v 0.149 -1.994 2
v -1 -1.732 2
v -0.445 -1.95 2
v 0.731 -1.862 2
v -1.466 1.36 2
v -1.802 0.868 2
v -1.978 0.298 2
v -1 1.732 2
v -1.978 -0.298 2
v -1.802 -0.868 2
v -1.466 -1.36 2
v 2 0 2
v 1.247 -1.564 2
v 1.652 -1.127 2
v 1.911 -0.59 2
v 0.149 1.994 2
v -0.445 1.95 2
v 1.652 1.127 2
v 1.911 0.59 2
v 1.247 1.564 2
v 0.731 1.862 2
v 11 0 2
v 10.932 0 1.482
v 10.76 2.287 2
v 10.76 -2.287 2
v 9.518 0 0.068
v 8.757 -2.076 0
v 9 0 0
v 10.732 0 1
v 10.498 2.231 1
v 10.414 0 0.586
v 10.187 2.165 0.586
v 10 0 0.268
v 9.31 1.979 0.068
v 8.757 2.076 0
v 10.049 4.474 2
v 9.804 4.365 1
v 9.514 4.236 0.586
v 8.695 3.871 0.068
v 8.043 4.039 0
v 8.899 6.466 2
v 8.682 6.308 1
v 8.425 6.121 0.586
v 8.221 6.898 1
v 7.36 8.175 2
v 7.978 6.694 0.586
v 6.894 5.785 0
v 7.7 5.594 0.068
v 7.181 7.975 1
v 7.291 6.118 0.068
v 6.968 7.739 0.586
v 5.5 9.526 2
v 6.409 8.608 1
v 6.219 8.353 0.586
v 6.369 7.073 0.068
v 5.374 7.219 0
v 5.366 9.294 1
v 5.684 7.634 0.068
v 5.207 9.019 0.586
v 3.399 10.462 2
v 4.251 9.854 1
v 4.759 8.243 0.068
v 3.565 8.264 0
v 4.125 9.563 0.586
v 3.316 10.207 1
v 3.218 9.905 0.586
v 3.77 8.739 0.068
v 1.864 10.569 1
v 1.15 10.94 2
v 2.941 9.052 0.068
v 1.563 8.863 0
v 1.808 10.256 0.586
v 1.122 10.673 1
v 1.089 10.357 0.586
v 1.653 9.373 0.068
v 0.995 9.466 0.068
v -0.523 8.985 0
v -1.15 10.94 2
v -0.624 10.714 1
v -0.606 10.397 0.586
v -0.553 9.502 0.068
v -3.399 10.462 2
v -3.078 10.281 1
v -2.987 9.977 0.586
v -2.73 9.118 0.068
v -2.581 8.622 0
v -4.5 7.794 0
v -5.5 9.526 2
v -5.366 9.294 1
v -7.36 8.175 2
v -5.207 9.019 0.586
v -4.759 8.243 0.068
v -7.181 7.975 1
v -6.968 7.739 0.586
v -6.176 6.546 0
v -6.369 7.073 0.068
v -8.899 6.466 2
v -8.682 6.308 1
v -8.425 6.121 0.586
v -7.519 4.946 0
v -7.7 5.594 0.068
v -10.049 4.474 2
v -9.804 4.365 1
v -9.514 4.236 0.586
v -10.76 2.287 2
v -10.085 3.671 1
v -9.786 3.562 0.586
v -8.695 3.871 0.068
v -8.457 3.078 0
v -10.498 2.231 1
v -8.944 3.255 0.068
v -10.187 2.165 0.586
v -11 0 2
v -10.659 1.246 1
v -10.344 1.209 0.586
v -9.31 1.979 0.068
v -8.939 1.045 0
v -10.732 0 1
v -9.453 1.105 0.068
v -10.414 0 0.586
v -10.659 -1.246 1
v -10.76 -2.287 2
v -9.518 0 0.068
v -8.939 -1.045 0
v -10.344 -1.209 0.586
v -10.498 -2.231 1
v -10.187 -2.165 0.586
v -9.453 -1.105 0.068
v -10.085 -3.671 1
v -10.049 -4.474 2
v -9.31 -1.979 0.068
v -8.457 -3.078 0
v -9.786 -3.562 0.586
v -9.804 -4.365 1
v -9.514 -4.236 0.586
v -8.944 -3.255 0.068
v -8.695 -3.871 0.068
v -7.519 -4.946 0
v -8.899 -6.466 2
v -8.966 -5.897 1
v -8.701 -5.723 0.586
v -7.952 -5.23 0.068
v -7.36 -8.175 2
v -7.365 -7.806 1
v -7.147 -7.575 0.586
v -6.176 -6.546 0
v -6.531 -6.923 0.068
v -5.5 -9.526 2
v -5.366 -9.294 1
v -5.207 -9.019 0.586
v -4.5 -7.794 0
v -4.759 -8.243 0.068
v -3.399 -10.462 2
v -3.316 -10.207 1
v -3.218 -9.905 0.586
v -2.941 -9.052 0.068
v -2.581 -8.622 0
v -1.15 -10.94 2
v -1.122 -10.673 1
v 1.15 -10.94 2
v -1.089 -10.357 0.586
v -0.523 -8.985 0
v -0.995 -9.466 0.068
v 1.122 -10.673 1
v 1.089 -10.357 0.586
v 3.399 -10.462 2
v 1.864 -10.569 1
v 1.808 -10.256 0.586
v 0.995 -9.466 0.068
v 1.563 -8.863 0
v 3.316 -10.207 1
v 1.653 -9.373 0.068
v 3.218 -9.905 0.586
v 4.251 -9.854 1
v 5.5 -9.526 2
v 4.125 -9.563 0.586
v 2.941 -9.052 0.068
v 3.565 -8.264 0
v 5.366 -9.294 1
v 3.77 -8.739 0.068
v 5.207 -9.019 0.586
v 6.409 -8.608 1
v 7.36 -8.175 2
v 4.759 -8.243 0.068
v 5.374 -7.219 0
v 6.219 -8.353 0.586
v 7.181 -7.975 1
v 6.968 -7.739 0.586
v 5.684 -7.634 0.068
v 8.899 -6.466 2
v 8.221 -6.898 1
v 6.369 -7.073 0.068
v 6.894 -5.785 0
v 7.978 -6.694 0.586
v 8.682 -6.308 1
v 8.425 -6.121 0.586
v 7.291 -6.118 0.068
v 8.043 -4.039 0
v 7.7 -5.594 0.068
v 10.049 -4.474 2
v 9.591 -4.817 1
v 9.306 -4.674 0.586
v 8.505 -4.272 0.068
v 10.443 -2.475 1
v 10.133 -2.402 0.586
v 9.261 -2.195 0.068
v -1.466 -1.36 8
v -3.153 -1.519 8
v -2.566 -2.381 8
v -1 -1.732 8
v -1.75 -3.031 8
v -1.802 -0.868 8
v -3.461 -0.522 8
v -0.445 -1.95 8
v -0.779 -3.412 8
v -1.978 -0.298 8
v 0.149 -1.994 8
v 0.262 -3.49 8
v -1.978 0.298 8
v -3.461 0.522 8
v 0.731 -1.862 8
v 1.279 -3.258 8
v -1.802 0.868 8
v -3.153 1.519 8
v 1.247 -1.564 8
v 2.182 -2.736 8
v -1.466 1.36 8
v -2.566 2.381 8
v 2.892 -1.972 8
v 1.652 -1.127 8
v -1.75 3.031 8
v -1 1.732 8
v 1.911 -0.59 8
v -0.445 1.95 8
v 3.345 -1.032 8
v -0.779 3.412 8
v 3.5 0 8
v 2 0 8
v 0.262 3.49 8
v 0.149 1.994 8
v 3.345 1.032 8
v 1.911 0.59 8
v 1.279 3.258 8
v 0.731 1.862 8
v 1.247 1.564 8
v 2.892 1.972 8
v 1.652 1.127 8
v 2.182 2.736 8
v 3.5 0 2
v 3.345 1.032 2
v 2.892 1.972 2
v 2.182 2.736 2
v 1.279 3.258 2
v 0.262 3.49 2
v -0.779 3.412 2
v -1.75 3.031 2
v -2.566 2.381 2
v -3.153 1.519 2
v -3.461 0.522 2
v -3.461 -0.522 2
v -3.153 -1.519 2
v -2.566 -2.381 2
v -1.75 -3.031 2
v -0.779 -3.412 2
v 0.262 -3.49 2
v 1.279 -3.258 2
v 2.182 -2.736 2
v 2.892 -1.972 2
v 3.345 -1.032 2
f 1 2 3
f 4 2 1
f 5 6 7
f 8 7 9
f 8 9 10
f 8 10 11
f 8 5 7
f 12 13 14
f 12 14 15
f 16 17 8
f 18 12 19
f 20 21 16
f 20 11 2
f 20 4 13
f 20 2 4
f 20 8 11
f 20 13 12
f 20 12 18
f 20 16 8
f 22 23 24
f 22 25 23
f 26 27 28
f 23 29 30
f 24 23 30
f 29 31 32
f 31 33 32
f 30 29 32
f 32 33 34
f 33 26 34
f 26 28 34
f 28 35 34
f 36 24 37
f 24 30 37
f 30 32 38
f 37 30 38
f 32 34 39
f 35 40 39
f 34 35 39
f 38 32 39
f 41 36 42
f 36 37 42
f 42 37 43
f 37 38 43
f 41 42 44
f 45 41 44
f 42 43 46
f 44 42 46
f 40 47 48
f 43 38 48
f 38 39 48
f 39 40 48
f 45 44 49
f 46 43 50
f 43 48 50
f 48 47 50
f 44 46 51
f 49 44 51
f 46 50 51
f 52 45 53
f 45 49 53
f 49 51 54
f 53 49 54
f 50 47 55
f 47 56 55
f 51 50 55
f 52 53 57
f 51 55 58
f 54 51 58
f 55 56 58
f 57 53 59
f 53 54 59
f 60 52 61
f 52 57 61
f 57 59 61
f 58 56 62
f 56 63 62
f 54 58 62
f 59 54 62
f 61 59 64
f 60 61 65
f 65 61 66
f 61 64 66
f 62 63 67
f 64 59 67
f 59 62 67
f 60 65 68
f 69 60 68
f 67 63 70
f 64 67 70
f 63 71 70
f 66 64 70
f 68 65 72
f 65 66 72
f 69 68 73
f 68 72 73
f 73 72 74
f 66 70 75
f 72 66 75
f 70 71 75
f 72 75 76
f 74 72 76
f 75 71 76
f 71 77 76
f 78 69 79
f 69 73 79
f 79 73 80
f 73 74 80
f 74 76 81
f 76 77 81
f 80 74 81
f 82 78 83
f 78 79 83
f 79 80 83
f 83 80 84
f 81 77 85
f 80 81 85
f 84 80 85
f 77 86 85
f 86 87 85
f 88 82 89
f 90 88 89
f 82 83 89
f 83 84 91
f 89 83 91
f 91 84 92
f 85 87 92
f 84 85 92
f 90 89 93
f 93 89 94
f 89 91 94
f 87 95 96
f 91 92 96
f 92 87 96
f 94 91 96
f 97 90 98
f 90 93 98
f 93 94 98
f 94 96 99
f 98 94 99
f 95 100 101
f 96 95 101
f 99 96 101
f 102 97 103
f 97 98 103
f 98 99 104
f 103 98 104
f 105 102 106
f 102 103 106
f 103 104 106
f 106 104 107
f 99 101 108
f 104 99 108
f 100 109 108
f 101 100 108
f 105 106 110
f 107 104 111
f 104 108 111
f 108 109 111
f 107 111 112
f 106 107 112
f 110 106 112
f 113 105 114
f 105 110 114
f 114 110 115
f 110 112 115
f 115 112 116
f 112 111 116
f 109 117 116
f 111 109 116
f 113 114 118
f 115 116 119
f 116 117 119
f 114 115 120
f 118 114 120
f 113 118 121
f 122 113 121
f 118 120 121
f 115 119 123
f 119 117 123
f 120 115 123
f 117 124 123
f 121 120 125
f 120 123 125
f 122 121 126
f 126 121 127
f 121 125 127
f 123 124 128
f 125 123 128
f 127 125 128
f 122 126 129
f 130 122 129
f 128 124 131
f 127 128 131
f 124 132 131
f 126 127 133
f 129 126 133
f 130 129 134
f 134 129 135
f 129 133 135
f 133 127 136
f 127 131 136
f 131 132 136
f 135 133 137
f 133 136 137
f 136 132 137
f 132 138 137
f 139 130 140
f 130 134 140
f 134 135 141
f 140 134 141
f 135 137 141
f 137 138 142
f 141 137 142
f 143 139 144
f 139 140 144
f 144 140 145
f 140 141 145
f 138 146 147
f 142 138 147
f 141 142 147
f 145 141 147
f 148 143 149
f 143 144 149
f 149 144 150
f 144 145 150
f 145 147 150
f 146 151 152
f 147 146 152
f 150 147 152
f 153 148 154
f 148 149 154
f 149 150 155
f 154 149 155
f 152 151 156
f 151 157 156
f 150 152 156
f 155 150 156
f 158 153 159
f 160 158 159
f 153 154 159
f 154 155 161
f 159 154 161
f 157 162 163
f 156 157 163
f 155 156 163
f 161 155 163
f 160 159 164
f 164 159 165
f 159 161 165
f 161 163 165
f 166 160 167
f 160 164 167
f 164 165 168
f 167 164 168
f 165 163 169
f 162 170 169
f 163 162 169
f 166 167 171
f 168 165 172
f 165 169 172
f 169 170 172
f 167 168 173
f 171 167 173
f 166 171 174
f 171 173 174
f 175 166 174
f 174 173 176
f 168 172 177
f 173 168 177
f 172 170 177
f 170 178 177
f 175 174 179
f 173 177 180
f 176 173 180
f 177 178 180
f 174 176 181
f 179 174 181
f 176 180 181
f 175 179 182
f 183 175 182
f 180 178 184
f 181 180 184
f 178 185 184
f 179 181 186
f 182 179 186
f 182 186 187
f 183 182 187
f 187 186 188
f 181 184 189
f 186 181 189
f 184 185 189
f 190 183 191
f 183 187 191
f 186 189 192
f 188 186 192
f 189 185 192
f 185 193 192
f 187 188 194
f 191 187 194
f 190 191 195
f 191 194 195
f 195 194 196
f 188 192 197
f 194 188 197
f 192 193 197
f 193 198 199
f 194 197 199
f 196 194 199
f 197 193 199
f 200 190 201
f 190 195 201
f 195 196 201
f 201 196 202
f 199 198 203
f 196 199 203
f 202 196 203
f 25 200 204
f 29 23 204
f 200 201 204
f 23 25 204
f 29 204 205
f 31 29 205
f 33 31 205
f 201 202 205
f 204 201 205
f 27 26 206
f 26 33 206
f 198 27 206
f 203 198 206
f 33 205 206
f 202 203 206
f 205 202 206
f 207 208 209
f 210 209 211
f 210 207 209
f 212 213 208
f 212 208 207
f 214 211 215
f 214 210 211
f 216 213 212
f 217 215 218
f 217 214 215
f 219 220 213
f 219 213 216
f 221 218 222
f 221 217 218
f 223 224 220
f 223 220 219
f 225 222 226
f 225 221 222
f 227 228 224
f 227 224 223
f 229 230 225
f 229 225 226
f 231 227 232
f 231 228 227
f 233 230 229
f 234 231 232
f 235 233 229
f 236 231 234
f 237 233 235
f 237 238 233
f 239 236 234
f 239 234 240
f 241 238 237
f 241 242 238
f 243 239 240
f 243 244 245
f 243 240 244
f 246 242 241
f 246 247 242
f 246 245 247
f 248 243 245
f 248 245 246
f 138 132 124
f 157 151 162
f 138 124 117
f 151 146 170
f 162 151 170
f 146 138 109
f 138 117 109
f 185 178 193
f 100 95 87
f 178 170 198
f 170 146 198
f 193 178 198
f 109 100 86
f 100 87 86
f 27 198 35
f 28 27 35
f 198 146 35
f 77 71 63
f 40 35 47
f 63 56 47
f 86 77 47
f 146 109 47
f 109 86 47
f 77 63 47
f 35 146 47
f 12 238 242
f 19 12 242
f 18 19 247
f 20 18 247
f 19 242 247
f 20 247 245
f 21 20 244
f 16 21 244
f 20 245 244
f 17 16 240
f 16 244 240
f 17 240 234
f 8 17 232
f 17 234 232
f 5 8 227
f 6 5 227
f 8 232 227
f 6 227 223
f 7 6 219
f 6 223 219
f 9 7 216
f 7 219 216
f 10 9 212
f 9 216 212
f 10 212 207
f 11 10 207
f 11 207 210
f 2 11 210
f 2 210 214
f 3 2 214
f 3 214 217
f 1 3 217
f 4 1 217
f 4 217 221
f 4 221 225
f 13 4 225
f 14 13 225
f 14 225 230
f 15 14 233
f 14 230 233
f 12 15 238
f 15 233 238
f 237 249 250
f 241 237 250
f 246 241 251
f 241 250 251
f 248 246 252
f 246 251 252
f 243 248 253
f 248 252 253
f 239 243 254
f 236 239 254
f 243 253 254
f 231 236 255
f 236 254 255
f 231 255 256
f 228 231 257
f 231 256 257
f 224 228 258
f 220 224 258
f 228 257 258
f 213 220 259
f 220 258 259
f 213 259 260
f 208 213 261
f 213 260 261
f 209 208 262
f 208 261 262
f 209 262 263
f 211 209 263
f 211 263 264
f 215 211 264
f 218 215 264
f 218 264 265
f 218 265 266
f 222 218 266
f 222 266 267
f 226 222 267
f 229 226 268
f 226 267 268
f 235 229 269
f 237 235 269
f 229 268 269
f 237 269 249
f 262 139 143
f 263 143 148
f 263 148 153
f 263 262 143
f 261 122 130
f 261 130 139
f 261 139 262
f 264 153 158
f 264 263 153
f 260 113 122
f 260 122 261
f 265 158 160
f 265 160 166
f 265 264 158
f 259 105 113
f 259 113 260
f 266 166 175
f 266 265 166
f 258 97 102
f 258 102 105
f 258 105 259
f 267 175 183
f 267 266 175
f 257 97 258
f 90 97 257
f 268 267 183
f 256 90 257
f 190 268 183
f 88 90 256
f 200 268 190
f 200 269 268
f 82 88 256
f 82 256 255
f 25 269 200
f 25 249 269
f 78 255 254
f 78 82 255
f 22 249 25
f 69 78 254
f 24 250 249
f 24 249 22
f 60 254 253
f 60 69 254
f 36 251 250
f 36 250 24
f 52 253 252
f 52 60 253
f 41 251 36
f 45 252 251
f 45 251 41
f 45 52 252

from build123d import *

# Parameters (mm, degrees)
F0_R     = 11
F1_DEPTH = 2
F2_R     = 3.5
F3_DEPTH = 6
F4_R     = 2
F5_DEPTH = 6
F6_R     = 1.99999


# Not quite as in the source:
# - a fillet or chamfer is up to 0.001 mm smaller than in the source, because OpenCascade refuses the exact size


with BuildPart() as f1:
    # F0 (on Top) → F1 (new body)
    with BuildSketch(Plane.XY):
        Circle(F0_R)
    extrude(amount=F1_DEPTH)

    # F2 (on face) → F3 (join)
    with BuildSketch(Plane.XY.offset(2)):
        Circle(F2_R)
    extrude(amount=F3_DEPTH)

    # F4 (on face) → F5 (cut)
    with BuildSketch(Plane.XY.offset(8)):
        Circle(F4_R)
    extrude(amount=-F5_DEPTH, mode=Mode.SUBTRACT)

    # F6 (radius 2 in the source; OpenCascade refuses exactly that, so slightly less here)
    f6_edges = [f1.edges().sort_by_distance(p)[0] for p in [
        (-11, 0, 0),
    ]]
    fillet(f6_edges, radius=F6_R)


solid = f1.part
